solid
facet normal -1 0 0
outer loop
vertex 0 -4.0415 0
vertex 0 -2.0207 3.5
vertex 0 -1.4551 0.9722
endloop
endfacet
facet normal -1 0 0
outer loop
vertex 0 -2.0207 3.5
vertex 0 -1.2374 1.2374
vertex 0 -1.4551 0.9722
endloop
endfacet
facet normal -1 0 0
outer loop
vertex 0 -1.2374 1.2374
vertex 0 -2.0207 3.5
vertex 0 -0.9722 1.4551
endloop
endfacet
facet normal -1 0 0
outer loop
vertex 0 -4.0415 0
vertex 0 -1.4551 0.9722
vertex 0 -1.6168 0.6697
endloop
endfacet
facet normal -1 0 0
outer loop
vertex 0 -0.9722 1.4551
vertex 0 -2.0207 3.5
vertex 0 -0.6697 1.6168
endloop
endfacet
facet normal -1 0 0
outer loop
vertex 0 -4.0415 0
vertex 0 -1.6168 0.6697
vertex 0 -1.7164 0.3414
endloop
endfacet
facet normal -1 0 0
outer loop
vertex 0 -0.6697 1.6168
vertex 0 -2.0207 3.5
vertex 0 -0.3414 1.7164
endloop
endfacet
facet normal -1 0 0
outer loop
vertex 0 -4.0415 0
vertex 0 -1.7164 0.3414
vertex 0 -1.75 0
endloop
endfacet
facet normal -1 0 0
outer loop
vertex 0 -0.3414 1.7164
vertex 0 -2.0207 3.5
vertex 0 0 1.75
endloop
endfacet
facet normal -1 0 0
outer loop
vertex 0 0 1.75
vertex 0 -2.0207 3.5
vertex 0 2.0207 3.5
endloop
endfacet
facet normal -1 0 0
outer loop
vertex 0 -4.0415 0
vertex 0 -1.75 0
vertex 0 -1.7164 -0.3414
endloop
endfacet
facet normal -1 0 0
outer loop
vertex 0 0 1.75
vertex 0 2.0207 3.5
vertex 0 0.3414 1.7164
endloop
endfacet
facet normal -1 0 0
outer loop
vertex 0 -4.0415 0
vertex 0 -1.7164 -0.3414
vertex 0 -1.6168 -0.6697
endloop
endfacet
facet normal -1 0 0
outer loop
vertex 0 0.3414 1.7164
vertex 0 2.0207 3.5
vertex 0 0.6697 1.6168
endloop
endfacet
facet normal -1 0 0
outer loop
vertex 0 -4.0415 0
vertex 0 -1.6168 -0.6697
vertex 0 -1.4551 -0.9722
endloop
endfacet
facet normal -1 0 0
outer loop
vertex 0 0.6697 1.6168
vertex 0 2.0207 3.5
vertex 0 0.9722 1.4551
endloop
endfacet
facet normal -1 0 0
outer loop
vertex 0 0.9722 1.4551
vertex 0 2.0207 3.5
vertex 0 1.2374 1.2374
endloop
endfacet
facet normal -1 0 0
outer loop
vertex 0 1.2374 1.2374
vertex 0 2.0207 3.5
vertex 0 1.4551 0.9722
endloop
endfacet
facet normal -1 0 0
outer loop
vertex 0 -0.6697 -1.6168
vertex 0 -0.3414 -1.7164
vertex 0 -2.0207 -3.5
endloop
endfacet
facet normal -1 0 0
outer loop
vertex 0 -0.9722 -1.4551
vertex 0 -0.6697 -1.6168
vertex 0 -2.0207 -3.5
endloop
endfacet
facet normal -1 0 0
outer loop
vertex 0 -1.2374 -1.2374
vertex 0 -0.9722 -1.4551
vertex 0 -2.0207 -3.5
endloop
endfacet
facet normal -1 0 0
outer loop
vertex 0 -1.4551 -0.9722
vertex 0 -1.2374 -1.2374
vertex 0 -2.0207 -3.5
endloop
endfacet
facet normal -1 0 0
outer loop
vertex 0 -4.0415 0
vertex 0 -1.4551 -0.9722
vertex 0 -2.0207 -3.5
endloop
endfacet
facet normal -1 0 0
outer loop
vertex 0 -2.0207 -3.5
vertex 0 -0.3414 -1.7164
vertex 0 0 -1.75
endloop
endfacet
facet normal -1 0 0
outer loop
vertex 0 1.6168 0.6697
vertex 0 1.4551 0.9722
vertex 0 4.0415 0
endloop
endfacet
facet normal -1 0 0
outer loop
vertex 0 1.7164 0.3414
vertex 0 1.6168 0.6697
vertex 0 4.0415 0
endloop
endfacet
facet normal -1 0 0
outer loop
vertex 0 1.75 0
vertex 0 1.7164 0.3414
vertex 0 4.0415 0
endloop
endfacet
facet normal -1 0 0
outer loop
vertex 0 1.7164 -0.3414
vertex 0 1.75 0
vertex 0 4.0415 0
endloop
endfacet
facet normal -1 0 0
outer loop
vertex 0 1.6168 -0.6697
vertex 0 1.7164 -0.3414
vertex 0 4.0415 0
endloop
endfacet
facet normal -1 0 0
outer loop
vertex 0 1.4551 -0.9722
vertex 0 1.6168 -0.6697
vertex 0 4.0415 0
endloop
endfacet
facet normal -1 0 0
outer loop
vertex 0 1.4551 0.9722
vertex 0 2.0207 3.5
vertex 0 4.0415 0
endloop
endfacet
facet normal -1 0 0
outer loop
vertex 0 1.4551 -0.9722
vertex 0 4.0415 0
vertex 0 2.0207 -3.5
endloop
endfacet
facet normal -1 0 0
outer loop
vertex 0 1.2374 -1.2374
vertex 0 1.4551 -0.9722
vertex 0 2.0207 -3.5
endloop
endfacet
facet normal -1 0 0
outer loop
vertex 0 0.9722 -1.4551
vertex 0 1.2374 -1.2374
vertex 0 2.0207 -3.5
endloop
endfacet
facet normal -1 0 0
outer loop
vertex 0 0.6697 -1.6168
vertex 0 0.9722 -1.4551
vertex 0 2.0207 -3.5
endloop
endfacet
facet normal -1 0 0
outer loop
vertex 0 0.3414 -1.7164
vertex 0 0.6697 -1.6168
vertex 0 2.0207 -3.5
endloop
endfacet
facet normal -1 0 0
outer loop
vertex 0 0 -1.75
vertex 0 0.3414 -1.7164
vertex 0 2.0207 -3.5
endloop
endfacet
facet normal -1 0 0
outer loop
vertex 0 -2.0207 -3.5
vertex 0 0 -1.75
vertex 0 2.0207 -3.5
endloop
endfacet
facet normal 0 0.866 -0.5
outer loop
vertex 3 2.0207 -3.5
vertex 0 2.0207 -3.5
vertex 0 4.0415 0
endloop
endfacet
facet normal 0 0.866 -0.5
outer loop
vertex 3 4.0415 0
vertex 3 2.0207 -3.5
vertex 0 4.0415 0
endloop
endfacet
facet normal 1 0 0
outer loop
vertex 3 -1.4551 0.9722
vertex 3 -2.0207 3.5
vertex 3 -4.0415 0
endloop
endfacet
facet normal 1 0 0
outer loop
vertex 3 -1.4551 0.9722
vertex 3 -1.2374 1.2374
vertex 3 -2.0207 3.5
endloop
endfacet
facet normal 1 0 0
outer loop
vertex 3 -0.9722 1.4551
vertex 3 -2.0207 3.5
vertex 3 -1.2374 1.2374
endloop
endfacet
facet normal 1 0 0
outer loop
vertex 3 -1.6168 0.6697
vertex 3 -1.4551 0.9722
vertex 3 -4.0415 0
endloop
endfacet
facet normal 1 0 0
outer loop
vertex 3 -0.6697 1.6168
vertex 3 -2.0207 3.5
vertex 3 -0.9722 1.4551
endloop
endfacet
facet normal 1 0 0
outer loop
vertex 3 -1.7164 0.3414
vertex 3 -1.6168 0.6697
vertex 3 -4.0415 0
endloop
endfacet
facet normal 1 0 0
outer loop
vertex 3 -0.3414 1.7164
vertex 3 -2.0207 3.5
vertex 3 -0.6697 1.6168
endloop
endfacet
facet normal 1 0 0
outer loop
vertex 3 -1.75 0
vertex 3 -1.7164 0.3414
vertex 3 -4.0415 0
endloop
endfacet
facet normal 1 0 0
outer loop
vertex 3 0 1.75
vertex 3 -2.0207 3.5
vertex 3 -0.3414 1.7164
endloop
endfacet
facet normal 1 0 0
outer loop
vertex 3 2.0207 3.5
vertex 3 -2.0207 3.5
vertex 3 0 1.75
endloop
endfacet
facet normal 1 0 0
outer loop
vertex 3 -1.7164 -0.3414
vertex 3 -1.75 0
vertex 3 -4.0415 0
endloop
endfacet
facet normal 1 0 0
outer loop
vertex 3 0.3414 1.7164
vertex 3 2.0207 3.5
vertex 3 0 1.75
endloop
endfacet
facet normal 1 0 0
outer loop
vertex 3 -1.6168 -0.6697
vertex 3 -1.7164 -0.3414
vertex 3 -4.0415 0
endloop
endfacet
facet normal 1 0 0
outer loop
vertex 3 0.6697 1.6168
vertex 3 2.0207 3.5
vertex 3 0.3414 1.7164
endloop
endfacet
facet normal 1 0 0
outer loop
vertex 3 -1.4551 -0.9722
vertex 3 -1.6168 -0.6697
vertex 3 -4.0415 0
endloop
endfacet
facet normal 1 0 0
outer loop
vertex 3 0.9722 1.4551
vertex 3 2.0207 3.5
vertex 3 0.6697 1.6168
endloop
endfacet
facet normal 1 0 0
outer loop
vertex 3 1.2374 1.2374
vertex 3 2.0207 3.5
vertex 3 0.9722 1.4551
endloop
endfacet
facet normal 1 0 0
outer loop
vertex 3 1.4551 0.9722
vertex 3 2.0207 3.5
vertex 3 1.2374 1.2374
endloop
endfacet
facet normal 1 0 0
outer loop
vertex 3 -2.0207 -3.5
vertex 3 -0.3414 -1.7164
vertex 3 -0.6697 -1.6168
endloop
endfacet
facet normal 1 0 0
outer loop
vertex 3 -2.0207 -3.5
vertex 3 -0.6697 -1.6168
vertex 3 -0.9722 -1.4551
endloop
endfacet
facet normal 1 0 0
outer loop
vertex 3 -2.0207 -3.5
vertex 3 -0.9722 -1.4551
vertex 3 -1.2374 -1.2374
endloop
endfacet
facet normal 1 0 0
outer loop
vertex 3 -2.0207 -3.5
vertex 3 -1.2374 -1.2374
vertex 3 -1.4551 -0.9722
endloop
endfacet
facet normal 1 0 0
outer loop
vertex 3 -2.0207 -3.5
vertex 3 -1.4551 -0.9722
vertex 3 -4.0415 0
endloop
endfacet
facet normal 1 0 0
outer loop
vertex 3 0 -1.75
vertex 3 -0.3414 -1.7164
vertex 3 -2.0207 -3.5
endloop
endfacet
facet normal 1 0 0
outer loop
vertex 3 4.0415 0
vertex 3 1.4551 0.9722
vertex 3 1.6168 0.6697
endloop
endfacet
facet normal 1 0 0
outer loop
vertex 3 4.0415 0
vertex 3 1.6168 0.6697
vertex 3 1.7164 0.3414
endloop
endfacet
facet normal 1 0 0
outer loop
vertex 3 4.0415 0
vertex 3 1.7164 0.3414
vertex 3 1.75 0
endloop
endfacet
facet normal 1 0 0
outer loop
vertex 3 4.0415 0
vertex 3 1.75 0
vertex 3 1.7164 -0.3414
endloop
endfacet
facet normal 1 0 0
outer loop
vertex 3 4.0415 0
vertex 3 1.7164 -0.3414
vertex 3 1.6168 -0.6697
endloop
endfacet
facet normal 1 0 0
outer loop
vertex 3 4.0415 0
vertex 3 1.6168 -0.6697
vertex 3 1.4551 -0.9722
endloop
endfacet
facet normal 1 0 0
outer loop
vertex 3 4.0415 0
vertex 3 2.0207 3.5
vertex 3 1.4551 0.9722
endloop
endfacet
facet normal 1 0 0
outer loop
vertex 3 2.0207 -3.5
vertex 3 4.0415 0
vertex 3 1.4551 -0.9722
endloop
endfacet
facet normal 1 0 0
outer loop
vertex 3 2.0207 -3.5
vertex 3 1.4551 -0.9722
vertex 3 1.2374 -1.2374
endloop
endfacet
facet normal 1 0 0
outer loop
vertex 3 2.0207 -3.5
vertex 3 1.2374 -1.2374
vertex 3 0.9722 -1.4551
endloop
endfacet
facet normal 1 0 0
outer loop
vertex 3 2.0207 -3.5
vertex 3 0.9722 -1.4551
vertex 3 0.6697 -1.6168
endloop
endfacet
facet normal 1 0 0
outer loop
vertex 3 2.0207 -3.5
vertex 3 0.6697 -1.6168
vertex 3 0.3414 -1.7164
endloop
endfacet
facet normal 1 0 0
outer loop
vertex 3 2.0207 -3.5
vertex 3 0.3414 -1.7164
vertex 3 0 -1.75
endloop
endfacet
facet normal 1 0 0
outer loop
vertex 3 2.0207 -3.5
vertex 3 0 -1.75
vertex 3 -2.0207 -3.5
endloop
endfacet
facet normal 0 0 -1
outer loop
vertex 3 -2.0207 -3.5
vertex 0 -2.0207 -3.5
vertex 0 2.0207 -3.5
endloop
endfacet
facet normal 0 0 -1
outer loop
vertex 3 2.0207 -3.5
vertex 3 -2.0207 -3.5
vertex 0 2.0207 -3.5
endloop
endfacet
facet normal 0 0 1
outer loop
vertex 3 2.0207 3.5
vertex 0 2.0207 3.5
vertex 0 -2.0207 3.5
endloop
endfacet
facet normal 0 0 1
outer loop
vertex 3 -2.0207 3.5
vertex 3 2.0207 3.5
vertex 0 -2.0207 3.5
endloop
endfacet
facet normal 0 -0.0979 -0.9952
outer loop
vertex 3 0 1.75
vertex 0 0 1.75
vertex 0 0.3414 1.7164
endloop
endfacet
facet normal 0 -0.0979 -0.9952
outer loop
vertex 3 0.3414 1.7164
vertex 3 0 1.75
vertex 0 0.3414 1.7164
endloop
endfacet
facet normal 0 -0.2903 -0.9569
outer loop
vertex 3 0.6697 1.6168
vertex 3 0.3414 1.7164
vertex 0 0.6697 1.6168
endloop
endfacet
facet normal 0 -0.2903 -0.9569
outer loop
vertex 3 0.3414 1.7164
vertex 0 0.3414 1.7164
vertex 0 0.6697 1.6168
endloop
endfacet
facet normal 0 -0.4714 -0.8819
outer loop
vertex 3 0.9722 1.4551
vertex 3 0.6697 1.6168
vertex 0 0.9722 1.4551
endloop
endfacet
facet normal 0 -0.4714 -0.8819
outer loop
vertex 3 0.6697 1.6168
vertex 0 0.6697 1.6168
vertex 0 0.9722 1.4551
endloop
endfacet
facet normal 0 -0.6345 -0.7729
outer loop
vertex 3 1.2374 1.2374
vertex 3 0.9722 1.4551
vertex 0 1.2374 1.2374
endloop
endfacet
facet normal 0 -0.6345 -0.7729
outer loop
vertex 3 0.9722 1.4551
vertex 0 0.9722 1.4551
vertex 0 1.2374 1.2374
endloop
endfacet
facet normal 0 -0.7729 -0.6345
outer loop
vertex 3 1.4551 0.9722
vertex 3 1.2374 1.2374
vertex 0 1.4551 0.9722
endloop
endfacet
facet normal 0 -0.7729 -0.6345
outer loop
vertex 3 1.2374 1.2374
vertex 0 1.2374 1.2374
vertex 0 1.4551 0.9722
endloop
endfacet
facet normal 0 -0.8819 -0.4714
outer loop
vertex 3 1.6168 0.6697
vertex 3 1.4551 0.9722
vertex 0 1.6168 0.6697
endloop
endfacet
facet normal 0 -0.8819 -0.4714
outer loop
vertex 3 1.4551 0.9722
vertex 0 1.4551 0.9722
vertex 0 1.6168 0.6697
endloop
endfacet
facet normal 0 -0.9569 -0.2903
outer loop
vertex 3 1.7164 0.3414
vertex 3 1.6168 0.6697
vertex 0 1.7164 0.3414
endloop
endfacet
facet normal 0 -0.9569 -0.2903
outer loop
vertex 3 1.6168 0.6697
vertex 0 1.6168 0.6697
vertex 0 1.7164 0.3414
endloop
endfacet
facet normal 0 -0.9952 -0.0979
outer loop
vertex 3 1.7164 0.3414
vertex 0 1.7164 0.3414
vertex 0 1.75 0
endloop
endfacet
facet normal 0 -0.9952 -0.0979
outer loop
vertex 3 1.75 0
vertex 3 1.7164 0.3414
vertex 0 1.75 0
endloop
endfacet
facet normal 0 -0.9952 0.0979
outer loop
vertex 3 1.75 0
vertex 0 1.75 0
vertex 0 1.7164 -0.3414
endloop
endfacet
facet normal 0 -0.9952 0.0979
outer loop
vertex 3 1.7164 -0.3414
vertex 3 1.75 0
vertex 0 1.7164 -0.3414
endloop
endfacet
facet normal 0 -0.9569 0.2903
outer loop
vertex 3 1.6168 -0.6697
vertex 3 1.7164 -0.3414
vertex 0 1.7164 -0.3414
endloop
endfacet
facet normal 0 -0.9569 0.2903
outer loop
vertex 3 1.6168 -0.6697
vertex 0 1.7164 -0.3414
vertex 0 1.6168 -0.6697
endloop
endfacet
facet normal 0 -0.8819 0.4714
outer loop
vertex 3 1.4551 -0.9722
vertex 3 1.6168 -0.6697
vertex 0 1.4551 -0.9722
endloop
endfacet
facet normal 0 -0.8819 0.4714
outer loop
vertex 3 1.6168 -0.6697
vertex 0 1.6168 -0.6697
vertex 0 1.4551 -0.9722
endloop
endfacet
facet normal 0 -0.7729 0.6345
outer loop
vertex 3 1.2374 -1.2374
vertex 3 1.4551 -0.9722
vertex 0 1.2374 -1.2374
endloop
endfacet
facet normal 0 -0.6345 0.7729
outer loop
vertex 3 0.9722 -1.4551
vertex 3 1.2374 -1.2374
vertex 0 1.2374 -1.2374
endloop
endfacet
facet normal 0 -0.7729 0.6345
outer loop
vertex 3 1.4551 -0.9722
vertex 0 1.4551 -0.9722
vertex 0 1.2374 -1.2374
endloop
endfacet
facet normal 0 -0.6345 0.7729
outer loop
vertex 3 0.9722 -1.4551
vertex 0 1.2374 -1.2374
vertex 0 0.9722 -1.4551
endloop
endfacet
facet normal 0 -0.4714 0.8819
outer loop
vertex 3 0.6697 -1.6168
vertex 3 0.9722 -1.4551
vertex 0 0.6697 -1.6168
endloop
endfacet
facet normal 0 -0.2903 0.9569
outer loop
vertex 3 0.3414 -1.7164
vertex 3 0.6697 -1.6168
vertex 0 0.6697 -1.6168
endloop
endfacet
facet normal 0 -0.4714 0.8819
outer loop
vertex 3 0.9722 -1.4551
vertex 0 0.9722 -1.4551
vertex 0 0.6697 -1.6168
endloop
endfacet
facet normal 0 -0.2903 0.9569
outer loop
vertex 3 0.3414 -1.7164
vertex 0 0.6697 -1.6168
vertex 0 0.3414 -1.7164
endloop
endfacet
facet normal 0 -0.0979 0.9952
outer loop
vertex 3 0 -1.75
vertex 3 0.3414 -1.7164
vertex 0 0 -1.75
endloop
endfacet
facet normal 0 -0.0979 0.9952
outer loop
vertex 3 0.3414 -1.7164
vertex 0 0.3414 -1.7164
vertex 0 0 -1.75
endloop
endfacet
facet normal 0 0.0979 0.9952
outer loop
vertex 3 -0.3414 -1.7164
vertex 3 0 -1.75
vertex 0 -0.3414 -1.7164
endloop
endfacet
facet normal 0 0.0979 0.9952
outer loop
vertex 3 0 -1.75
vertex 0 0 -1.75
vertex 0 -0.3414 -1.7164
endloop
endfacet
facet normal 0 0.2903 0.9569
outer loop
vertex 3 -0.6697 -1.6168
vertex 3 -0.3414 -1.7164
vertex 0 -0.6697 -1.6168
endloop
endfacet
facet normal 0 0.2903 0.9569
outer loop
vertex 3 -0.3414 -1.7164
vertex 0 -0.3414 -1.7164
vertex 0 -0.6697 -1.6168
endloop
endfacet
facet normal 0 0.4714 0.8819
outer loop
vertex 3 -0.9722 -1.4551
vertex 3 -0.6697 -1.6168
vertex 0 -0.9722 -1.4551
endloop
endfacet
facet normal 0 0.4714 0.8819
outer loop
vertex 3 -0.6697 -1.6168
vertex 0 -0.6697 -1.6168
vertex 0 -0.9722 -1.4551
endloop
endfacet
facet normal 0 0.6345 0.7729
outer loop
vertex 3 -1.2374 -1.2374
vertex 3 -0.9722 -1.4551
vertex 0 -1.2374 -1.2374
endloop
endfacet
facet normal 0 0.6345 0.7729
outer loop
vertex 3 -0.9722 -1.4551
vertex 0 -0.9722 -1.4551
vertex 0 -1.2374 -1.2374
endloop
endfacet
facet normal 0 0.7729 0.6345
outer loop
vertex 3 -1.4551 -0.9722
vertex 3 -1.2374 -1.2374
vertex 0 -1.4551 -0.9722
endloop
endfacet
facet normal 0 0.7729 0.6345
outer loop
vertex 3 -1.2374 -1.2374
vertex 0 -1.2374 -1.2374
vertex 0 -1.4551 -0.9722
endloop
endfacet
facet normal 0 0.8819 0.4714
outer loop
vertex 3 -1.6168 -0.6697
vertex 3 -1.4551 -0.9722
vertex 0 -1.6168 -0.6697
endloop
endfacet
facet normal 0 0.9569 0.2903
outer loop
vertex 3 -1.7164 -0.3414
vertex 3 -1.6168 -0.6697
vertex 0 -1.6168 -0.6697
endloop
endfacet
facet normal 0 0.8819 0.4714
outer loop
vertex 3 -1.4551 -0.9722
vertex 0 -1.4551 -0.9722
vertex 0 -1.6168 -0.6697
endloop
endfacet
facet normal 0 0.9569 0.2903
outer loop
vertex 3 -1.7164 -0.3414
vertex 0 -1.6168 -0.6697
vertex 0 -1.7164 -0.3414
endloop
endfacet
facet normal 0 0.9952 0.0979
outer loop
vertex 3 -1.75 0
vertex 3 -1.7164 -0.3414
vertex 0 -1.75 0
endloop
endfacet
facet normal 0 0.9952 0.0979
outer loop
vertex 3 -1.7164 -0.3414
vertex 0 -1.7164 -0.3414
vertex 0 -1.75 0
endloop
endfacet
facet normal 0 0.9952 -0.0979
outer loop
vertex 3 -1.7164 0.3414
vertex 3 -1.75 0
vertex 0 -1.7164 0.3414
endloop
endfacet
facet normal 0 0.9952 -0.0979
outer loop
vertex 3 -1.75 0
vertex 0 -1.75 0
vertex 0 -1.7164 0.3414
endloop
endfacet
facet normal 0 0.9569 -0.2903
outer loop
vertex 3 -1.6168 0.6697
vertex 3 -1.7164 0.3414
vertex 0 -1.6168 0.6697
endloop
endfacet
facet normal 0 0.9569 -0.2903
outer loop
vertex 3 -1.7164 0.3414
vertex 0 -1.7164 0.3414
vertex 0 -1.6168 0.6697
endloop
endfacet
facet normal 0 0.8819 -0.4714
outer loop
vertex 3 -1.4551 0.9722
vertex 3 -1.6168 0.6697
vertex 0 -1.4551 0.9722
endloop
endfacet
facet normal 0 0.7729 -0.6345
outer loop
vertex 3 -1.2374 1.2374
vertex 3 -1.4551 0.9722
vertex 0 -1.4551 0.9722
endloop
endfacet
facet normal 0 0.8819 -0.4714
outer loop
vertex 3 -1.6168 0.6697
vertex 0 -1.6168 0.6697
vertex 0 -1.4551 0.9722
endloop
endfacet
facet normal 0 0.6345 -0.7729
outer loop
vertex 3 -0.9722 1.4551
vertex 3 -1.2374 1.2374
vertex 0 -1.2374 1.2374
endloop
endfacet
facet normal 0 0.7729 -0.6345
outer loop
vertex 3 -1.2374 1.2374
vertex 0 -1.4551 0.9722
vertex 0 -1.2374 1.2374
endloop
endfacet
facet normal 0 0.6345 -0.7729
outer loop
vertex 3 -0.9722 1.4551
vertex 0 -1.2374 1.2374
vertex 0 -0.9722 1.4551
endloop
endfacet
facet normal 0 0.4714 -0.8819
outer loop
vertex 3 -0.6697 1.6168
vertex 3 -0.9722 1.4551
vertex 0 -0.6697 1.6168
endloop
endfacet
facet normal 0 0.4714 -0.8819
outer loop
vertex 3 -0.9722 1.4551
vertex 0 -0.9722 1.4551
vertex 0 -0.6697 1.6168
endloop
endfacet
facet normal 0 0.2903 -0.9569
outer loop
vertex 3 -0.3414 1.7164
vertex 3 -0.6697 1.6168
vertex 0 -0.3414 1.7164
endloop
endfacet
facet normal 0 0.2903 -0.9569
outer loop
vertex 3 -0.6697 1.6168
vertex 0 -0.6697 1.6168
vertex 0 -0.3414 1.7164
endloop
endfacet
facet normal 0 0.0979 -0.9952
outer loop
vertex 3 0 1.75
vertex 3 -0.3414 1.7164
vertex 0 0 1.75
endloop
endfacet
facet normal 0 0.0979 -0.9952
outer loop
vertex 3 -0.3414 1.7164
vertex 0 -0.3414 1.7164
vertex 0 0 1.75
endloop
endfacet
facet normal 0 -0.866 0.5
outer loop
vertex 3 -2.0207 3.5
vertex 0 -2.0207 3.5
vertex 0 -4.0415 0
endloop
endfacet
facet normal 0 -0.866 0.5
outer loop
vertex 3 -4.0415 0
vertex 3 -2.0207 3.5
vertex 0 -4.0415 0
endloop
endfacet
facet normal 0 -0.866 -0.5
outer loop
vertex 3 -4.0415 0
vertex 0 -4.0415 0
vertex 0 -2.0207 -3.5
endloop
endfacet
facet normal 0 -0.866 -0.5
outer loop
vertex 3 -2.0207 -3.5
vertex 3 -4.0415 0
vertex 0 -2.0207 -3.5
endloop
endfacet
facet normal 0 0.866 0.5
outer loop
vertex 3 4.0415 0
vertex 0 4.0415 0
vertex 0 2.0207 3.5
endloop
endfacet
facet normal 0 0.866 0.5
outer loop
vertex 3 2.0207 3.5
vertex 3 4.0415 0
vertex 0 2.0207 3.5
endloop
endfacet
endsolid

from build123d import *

# Parameters (mm, degrees)
HEX_HEAD_DEPTH     = 3
SKETCH2_R          = 1.75
CUT_EXTRUDE1_DEPTH = 3


with BuildPart() as part:
    # Sketch1 → Hex_Head (new body)
    with BuildSketch(Plane(origin=(0, 0, 0), x_dir=(0, 0, -1), z_dir=(1, 0, 0))):
        Polygon((3.5, -2.020725942), (3.5, 2.020725942), (0, 4.041451884), (-3.5, 2.020725942), (-3.5, -2.020725942), (0, -4.041451884), align=None)
    extrude(amount=HEX_HEAD_DEPTH)

    # Sketch2 → Cut-Extrude1 (cut)
    with BuildSketch(Plane.ZY):
        Circle(SKETCH2_R)
    extrude(amount=-CUT_EXTRUDE1_DEPTH, mode=Mode.SUBTRACT)


solid = part.part
